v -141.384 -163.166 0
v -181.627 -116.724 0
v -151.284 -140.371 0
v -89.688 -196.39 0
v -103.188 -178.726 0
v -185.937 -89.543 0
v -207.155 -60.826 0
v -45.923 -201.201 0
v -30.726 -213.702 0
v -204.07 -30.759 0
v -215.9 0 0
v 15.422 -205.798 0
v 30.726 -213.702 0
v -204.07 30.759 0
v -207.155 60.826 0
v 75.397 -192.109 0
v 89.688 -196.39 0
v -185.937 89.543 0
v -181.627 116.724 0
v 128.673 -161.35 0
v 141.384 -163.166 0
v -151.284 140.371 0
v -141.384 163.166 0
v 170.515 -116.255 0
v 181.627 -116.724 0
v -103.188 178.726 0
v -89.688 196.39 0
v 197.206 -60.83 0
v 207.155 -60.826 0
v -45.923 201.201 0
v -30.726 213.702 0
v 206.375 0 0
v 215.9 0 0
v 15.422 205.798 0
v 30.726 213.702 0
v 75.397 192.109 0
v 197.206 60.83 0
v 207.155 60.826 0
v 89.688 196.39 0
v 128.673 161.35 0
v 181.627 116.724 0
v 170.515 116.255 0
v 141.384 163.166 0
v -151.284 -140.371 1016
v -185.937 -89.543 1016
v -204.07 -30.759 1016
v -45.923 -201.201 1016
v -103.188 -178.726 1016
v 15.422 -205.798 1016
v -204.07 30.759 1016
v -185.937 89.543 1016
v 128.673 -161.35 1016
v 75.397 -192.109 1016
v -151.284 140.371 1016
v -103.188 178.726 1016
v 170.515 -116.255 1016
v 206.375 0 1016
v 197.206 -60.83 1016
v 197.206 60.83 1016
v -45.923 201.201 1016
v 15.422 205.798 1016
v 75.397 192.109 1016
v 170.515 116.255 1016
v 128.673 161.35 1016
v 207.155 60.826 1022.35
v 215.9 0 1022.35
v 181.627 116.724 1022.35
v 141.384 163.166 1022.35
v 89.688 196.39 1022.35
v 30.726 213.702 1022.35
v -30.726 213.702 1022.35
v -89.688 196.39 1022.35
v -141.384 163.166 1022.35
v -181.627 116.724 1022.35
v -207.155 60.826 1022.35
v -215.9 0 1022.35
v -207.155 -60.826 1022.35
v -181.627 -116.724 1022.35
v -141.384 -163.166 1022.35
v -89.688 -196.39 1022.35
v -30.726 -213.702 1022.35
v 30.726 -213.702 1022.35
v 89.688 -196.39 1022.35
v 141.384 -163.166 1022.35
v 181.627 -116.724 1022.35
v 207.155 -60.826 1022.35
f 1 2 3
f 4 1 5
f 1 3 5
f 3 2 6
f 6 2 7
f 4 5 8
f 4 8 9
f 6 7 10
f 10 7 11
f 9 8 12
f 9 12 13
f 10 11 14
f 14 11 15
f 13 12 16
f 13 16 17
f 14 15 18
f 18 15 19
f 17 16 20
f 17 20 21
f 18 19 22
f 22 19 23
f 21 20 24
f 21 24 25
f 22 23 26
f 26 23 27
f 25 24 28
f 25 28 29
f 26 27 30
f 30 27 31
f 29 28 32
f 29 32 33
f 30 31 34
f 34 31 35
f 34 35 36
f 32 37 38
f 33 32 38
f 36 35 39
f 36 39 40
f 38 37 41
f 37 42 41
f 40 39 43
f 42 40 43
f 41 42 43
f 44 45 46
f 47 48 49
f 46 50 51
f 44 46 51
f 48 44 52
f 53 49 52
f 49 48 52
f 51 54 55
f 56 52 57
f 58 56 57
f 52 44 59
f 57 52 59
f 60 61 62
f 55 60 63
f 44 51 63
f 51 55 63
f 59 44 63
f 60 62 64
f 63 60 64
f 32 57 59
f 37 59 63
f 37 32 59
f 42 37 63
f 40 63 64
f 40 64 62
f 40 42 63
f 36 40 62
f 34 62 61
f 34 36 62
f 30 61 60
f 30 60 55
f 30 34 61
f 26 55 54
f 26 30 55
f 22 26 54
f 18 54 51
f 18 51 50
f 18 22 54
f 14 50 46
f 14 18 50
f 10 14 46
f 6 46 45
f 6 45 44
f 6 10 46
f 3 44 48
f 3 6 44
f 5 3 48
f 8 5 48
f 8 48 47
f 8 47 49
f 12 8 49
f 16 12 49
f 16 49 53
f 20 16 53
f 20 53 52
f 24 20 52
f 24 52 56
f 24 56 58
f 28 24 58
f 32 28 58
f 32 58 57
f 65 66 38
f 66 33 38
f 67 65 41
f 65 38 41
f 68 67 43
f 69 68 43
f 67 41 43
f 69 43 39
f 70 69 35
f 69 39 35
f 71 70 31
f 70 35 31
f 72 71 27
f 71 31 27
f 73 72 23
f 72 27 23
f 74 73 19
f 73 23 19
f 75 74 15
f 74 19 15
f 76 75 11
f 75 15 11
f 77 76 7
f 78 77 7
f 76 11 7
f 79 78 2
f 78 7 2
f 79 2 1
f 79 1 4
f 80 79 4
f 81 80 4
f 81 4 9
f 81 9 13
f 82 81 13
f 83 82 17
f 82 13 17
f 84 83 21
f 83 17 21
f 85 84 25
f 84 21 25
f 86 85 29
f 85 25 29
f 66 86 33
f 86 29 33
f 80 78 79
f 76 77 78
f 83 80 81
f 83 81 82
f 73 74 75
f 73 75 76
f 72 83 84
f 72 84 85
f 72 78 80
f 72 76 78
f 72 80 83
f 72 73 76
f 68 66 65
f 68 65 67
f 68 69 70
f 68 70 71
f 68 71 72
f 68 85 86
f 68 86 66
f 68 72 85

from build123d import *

# Parameters (mm, degrees)
F0_R     = 215.9
F0_R_2   = 206.375
F1_DEPTH = 457.2
F2_DEPTH = 1016
F3_R     = 215.9
F4_DEPTH = 6.35


with BuildPart() as f1:
    # F0 (on Top) → F1 (new body)
    with BuildSketch(Plane.XY):
        Circle(F0_R)
        Circle(F0_R_2, mode=Mode.SUBTRACT)
    extrude(amount=F1_DEPTH)

    # F0 (on Top) → F2 (join)
    with BuildSketch(Plane.XY):
        Circle(F0_R)
        Circle(F0_R_2, mode=Mode.SUBTRACT)
    extrude(amount=F2_DEPTH)

    # F3 (on face) → F4 (join)
    with BuildSketch(Plane.XY.offset(1016)):
        Circle(F3_R)
    extrude(amount=F4_DEPTH)


solid = f1.part
